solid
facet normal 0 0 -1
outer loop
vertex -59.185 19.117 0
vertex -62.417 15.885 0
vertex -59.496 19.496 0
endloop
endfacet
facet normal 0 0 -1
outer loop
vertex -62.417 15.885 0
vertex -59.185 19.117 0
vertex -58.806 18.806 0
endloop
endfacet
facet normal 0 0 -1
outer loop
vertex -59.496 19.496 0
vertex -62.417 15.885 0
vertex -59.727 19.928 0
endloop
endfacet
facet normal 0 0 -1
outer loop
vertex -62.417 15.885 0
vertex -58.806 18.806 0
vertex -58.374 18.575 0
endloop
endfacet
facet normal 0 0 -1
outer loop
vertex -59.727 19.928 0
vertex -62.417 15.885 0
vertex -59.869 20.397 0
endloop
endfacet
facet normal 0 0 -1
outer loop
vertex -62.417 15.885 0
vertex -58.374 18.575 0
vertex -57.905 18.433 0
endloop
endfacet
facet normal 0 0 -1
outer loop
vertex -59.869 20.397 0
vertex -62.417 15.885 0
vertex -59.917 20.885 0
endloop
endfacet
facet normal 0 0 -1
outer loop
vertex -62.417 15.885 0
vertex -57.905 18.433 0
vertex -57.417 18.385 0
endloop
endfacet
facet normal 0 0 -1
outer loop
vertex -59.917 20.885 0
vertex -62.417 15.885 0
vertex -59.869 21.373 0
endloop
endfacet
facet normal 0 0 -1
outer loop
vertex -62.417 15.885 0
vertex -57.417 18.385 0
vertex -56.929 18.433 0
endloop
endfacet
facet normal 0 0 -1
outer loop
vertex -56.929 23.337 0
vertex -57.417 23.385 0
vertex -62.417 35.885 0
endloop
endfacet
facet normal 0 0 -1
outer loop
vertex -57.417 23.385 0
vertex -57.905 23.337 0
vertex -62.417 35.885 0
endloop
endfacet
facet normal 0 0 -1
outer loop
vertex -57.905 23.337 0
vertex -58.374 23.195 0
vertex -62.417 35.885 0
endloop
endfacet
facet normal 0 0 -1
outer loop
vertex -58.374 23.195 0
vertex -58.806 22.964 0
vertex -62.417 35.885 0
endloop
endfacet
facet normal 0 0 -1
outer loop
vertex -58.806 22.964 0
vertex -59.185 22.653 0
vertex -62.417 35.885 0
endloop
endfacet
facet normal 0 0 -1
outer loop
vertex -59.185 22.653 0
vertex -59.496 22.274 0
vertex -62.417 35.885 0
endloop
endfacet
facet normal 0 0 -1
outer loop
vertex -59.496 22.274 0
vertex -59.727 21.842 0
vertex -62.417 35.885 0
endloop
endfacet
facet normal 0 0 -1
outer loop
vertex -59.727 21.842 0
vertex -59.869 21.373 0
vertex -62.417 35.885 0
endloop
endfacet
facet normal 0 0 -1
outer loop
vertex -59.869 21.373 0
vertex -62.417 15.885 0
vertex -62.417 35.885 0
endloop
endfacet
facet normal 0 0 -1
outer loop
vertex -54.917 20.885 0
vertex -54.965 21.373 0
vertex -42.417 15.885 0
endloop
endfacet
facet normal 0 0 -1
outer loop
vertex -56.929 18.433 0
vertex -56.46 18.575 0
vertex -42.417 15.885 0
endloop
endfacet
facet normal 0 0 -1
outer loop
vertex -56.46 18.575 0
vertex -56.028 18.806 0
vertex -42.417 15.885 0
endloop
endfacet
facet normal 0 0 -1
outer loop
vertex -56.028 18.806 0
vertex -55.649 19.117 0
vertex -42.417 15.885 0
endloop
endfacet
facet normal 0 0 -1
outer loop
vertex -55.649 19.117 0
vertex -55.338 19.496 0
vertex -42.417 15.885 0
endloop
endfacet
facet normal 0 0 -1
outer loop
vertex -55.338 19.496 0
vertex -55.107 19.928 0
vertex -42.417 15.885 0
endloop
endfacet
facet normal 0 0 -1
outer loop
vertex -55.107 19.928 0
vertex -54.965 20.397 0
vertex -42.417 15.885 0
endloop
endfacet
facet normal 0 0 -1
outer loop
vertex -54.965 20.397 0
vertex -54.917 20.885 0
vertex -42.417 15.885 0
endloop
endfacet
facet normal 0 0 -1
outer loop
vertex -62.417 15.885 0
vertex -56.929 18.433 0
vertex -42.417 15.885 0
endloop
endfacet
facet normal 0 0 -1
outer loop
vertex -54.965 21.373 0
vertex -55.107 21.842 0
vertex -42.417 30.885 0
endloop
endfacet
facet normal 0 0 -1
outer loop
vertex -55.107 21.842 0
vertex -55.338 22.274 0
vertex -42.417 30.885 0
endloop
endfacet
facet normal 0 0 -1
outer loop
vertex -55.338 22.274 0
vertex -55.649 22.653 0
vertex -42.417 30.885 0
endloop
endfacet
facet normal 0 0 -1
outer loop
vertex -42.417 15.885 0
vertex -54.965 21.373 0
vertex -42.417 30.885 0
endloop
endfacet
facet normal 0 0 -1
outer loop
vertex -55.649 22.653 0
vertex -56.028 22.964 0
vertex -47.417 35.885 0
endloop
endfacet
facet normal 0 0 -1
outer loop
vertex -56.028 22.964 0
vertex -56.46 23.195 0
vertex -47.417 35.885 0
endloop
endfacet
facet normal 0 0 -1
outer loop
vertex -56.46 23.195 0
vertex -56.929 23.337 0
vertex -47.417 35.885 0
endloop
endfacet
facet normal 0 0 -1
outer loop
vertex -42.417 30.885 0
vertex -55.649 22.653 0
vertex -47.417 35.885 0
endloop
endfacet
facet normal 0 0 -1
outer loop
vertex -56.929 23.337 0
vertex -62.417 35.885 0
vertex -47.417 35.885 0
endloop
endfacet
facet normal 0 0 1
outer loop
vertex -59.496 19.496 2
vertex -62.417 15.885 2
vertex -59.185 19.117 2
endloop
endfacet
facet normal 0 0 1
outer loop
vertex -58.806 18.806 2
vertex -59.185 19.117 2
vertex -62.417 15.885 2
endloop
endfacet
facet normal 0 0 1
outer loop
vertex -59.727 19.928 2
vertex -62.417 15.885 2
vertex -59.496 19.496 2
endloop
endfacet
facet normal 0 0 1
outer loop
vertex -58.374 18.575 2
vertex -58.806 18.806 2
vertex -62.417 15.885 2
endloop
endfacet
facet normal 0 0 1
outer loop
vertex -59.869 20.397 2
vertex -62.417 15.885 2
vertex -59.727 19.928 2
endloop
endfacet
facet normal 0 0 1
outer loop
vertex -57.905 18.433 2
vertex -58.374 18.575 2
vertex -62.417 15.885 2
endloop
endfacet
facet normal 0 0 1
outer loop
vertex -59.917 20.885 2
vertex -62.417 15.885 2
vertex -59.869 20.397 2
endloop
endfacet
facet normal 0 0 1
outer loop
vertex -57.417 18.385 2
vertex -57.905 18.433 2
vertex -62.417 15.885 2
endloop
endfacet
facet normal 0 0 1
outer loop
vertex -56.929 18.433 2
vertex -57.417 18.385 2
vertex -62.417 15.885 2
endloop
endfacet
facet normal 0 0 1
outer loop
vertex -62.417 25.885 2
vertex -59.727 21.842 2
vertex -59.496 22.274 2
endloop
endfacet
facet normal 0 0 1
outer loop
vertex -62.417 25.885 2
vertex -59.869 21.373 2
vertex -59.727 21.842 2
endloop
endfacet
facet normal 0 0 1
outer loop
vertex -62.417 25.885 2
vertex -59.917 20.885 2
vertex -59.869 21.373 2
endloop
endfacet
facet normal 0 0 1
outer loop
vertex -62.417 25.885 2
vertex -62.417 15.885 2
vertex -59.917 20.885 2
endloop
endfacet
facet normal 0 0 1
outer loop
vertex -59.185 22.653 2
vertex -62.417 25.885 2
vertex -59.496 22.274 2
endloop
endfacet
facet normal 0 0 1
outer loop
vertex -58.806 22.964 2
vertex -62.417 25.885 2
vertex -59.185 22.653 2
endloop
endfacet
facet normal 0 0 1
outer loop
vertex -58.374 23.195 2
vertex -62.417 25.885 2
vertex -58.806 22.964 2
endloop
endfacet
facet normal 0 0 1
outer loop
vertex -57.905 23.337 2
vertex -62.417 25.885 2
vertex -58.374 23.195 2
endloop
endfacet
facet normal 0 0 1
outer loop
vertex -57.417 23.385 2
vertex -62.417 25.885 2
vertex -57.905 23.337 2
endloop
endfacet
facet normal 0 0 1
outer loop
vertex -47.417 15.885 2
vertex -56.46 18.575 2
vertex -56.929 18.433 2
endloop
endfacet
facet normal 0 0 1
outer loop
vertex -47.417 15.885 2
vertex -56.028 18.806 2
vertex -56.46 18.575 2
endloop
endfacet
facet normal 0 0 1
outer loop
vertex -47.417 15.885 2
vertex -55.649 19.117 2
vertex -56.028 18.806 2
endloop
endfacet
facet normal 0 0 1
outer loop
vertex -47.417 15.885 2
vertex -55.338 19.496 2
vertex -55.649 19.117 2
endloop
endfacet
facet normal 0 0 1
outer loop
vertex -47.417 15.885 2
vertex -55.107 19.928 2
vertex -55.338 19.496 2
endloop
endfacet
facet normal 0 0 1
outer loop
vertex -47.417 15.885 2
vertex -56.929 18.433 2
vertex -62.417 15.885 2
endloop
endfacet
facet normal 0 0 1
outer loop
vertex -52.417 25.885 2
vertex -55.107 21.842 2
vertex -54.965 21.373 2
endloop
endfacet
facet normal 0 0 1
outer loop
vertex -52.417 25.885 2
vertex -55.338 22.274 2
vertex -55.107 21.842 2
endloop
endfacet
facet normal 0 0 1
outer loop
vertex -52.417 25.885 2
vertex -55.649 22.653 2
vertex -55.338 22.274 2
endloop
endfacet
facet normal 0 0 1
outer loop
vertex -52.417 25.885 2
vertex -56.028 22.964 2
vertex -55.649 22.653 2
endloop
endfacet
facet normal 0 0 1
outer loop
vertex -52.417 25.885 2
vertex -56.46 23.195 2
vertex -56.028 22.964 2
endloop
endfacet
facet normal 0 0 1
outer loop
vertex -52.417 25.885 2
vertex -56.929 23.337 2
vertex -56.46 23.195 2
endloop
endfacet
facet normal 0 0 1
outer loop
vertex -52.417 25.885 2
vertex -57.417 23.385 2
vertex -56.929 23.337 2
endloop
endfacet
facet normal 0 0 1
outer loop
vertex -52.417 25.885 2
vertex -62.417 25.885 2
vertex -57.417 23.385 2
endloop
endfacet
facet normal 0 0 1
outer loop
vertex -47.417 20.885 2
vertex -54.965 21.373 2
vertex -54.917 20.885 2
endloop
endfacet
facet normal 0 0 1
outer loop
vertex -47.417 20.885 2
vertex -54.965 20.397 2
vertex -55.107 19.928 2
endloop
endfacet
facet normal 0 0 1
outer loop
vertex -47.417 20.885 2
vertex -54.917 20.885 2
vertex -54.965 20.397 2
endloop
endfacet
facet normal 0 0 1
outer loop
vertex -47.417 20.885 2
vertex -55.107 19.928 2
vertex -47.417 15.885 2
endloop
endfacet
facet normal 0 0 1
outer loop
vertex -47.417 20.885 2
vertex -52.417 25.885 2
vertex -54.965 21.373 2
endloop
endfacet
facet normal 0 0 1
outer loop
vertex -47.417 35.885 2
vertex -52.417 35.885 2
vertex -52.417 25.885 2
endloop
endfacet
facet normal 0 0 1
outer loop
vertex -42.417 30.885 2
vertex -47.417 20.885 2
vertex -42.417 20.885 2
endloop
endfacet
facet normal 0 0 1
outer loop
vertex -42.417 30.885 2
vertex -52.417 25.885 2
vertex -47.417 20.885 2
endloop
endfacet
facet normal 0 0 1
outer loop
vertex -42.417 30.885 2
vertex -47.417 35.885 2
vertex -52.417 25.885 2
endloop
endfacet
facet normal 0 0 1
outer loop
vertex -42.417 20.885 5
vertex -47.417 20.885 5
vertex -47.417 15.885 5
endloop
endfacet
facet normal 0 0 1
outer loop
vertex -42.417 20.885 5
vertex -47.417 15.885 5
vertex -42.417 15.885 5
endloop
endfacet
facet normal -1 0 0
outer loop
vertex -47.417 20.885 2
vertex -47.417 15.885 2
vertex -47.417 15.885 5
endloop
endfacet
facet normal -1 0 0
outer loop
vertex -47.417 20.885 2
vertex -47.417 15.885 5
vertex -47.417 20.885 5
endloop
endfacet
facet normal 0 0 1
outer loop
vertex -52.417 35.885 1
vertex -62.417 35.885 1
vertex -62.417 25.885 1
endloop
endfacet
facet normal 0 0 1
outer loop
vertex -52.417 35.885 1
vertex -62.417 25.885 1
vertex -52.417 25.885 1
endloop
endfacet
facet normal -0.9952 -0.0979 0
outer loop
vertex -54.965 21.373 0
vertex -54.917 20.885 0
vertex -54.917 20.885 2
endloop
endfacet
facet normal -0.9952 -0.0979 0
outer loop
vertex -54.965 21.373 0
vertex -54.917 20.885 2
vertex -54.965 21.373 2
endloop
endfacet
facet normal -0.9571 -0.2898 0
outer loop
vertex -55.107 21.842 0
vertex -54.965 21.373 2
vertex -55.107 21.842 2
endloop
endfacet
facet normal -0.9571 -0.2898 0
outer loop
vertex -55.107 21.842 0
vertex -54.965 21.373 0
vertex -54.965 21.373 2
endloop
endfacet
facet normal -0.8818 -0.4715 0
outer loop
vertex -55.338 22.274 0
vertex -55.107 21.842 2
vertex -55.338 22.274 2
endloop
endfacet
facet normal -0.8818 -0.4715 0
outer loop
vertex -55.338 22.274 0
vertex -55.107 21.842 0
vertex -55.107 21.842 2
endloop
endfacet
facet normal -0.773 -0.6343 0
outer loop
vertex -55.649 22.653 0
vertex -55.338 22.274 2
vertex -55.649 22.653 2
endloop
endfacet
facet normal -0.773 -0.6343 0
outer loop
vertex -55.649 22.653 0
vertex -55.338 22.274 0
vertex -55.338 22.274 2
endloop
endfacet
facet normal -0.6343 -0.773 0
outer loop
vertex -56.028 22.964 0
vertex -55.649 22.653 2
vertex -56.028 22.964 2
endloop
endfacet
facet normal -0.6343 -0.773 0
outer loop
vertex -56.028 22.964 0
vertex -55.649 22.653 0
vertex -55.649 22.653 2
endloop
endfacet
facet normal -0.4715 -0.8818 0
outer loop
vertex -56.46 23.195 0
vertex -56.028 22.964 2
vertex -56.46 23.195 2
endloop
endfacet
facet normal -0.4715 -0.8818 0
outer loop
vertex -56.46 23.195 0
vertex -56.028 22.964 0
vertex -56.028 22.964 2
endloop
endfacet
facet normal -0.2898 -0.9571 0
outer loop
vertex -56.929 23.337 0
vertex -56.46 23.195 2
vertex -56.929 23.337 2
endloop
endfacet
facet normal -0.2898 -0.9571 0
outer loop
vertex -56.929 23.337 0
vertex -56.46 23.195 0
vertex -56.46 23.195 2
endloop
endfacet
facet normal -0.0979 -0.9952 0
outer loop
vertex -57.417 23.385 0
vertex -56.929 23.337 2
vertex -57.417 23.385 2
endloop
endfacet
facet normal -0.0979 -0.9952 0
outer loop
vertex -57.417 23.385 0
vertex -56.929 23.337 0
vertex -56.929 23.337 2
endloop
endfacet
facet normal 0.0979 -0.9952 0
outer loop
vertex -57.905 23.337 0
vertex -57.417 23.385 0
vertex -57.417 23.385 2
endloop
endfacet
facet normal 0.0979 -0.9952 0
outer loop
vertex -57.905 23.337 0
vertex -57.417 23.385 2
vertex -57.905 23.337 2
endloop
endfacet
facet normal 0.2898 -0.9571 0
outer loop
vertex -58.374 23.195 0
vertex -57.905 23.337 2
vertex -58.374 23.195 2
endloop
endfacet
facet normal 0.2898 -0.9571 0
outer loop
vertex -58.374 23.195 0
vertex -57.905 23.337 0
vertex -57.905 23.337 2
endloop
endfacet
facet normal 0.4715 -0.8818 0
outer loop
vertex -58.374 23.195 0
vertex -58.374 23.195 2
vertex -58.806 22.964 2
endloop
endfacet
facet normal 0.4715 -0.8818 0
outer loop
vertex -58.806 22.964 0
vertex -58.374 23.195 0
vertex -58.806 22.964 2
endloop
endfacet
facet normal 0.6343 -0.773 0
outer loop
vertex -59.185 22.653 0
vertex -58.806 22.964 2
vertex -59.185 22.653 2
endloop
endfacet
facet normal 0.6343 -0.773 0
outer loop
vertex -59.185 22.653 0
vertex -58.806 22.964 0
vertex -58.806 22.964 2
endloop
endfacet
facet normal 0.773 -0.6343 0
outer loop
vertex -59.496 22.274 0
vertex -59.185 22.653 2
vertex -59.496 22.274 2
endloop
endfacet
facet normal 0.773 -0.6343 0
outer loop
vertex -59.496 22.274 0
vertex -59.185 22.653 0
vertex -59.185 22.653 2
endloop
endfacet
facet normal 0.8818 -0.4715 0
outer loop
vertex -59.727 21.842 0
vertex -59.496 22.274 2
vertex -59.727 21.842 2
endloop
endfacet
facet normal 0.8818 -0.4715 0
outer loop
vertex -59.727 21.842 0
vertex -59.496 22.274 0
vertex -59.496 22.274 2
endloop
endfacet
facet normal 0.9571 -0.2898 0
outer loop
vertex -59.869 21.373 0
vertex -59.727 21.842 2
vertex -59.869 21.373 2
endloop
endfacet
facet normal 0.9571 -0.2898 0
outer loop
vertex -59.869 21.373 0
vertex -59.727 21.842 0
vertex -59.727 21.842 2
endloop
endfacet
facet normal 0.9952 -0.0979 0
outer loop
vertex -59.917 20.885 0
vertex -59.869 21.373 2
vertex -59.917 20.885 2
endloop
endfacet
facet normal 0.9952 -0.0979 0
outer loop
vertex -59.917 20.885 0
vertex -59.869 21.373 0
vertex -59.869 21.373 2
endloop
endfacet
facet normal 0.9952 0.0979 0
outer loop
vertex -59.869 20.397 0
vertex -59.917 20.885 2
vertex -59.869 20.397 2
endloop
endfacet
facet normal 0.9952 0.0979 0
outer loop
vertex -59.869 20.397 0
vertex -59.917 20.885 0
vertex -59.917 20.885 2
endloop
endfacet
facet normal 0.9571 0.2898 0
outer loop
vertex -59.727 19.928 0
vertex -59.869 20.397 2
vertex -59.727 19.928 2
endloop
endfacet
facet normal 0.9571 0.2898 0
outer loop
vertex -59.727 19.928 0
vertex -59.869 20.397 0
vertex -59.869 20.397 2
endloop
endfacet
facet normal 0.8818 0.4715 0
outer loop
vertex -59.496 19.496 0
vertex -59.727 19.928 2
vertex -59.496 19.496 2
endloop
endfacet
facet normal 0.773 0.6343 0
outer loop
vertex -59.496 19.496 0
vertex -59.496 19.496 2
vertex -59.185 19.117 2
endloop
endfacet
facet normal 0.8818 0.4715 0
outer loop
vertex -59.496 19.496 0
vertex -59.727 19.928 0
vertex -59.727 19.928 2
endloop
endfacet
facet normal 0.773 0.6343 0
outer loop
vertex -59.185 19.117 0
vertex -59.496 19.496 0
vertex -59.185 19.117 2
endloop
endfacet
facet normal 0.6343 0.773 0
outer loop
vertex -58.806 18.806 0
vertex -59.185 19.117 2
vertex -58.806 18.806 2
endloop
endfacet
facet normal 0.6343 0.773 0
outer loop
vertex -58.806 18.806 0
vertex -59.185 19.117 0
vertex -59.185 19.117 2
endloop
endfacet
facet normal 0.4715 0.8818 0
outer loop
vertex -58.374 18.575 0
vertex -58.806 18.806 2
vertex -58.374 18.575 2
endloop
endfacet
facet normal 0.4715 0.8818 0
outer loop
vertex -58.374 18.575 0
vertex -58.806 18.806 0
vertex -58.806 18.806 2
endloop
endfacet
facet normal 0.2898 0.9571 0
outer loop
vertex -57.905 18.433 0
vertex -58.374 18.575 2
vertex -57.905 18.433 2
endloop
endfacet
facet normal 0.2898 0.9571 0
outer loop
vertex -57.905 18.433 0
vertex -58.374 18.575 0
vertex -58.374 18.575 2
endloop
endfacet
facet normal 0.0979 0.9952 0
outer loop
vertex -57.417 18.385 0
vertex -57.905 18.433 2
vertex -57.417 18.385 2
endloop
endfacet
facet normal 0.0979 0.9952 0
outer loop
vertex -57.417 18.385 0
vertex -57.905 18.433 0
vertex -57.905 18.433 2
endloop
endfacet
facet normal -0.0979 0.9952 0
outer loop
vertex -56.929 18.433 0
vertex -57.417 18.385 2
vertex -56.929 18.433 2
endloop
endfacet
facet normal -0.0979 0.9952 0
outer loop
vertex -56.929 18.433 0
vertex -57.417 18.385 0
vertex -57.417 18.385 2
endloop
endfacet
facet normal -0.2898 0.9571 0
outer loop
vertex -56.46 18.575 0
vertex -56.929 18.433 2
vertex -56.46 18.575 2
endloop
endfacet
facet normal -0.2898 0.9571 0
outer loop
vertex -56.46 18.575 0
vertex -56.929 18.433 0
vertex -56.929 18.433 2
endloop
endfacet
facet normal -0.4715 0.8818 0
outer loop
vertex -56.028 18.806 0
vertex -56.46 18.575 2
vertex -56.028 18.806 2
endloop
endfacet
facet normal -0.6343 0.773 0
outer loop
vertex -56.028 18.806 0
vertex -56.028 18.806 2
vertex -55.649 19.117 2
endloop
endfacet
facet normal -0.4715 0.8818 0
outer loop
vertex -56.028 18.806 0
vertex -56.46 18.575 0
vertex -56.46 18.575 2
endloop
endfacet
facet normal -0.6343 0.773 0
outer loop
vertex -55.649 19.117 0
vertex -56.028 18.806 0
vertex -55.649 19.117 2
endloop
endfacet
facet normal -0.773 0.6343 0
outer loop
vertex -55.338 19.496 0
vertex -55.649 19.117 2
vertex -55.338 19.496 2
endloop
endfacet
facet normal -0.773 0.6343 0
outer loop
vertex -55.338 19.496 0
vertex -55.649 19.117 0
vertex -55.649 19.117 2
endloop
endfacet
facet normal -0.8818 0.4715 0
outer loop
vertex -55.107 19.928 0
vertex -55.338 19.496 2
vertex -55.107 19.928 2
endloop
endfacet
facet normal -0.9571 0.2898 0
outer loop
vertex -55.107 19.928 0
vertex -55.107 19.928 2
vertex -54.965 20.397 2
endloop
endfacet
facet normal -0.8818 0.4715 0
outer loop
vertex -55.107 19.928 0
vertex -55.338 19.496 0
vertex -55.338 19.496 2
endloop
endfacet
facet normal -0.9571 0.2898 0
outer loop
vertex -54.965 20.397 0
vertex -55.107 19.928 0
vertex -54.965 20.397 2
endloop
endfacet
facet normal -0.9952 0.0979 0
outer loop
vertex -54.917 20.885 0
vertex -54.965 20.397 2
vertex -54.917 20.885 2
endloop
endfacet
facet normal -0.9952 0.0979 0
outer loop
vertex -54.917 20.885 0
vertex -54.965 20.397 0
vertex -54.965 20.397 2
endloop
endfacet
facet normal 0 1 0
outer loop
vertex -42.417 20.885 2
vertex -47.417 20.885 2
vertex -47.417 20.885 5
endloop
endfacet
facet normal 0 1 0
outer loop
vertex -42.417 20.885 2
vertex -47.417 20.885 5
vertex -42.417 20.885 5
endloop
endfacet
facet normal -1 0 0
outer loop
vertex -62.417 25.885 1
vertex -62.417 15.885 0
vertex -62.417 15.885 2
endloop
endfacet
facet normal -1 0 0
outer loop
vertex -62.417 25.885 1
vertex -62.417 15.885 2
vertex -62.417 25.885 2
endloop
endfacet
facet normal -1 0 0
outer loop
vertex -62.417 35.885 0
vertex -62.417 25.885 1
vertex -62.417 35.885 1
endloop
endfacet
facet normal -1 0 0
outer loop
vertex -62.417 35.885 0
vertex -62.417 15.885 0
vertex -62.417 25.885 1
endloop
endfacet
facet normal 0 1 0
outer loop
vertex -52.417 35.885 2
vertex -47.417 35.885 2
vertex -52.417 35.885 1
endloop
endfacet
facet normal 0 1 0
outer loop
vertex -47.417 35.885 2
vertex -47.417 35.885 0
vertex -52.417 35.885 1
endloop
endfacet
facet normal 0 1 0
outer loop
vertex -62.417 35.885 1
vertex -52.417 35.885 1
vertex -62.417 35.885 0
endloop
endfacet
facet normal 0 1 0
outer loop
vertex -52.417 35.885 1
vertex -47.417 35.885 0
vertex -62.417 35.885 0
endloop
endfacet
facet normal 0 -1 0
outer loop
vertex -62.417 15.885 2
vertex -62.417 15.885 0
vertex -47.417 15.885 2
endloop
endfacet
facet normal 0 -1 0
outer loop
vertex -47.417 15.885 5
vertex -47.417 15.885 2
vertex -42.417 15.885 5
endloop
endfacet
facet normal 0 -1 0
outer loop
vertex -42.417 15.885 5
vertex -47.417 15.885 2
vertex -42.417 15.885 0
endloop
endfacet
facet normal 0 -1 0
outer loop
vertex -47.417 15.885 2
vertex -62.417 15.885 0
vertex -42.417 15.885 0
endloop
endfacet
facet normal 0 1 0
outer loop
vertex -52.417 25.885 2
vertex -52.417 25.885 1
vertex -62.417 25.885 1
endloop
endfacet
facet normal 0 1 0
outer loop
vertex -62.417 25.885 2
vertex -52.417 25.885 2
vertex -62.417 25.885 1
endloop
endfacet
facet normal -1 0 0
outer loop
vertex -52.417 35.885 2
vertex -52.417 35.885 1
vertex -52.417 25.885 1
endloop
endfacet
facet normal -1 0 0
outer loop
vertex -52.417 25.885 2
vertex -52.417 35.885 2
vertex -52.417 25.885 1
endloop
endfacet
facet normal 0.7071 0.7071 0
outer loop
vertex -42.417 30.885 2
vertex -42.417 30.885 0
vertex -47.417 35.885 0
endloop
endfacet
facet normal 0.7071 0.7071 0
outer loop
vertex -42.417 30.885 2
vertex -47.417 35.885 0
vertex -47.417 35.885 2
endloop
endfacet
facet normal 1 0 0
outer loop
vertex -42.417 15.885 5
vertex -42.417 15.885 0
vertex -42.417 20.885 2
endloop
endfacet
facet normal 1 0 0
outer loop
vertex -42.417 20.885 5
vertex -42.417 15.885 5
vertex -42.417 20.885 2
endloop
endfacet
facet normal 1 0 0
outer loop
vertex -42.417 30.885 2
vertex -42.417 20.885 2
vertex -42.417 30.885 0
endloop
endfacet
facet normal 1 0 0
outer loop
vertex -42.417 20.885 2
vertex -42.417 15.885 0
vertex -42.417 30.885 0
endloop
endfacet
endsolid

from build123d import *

# Parameters (mm, degrees)
F0_W     = 10
F0_H     = 10
F1_DEPTH = 1
F0_R     = 2.5
F2_DEPTH = 2
F0_W_2   = 5
F0_H_2   = 5
F3_DEPTH = 5
F4_SIZE  = 5


with BuildPart() as f1:
    # F0 (on Top) → F1 (new body)
    with BuildSketch(Plane.XY):
        with Locations((-57.417053, 30.885033)):
            Rectangle(F0_W, F0_H)
    extrude(amount=F1_DEPTH)

    # F0 (on Top) → F2 (join)
    with BuildSketch(Plane.XY):
        Polygon((-42.417053, 35.885033), (-52.417053, 35.885033), (-52.417053, 25.885033), (-62.417053, 25.885033), (-62.417053, 15.885033), (-47.417053, 15.885033), (-47.417053, 20.885033), (-42.417053, 20.885033), align=None)
        with Locations((-57.417053, 20.885033)):
            Circle(F0_R, mode=Mode.SUBTRACT)
    extrude(amount=F2_DEPTH)

    # F0 (on Top) → F3 (join)
    with BuildSketch(Plane.XY):
        with Locations((-44.917053, 18.385033)):
            Rectangle(F0_W_2, F0_H_2)
    extrude(amount=F3_DEPTH)

    # F4
    f4_edges = [f1.edges().sort_by_distance(p)[0] for p in [
        (-42.417053, 35.885033, 1),
    ]]
    chamfer(f4_edges, length=F4_SIZE)


solid = f1.part
